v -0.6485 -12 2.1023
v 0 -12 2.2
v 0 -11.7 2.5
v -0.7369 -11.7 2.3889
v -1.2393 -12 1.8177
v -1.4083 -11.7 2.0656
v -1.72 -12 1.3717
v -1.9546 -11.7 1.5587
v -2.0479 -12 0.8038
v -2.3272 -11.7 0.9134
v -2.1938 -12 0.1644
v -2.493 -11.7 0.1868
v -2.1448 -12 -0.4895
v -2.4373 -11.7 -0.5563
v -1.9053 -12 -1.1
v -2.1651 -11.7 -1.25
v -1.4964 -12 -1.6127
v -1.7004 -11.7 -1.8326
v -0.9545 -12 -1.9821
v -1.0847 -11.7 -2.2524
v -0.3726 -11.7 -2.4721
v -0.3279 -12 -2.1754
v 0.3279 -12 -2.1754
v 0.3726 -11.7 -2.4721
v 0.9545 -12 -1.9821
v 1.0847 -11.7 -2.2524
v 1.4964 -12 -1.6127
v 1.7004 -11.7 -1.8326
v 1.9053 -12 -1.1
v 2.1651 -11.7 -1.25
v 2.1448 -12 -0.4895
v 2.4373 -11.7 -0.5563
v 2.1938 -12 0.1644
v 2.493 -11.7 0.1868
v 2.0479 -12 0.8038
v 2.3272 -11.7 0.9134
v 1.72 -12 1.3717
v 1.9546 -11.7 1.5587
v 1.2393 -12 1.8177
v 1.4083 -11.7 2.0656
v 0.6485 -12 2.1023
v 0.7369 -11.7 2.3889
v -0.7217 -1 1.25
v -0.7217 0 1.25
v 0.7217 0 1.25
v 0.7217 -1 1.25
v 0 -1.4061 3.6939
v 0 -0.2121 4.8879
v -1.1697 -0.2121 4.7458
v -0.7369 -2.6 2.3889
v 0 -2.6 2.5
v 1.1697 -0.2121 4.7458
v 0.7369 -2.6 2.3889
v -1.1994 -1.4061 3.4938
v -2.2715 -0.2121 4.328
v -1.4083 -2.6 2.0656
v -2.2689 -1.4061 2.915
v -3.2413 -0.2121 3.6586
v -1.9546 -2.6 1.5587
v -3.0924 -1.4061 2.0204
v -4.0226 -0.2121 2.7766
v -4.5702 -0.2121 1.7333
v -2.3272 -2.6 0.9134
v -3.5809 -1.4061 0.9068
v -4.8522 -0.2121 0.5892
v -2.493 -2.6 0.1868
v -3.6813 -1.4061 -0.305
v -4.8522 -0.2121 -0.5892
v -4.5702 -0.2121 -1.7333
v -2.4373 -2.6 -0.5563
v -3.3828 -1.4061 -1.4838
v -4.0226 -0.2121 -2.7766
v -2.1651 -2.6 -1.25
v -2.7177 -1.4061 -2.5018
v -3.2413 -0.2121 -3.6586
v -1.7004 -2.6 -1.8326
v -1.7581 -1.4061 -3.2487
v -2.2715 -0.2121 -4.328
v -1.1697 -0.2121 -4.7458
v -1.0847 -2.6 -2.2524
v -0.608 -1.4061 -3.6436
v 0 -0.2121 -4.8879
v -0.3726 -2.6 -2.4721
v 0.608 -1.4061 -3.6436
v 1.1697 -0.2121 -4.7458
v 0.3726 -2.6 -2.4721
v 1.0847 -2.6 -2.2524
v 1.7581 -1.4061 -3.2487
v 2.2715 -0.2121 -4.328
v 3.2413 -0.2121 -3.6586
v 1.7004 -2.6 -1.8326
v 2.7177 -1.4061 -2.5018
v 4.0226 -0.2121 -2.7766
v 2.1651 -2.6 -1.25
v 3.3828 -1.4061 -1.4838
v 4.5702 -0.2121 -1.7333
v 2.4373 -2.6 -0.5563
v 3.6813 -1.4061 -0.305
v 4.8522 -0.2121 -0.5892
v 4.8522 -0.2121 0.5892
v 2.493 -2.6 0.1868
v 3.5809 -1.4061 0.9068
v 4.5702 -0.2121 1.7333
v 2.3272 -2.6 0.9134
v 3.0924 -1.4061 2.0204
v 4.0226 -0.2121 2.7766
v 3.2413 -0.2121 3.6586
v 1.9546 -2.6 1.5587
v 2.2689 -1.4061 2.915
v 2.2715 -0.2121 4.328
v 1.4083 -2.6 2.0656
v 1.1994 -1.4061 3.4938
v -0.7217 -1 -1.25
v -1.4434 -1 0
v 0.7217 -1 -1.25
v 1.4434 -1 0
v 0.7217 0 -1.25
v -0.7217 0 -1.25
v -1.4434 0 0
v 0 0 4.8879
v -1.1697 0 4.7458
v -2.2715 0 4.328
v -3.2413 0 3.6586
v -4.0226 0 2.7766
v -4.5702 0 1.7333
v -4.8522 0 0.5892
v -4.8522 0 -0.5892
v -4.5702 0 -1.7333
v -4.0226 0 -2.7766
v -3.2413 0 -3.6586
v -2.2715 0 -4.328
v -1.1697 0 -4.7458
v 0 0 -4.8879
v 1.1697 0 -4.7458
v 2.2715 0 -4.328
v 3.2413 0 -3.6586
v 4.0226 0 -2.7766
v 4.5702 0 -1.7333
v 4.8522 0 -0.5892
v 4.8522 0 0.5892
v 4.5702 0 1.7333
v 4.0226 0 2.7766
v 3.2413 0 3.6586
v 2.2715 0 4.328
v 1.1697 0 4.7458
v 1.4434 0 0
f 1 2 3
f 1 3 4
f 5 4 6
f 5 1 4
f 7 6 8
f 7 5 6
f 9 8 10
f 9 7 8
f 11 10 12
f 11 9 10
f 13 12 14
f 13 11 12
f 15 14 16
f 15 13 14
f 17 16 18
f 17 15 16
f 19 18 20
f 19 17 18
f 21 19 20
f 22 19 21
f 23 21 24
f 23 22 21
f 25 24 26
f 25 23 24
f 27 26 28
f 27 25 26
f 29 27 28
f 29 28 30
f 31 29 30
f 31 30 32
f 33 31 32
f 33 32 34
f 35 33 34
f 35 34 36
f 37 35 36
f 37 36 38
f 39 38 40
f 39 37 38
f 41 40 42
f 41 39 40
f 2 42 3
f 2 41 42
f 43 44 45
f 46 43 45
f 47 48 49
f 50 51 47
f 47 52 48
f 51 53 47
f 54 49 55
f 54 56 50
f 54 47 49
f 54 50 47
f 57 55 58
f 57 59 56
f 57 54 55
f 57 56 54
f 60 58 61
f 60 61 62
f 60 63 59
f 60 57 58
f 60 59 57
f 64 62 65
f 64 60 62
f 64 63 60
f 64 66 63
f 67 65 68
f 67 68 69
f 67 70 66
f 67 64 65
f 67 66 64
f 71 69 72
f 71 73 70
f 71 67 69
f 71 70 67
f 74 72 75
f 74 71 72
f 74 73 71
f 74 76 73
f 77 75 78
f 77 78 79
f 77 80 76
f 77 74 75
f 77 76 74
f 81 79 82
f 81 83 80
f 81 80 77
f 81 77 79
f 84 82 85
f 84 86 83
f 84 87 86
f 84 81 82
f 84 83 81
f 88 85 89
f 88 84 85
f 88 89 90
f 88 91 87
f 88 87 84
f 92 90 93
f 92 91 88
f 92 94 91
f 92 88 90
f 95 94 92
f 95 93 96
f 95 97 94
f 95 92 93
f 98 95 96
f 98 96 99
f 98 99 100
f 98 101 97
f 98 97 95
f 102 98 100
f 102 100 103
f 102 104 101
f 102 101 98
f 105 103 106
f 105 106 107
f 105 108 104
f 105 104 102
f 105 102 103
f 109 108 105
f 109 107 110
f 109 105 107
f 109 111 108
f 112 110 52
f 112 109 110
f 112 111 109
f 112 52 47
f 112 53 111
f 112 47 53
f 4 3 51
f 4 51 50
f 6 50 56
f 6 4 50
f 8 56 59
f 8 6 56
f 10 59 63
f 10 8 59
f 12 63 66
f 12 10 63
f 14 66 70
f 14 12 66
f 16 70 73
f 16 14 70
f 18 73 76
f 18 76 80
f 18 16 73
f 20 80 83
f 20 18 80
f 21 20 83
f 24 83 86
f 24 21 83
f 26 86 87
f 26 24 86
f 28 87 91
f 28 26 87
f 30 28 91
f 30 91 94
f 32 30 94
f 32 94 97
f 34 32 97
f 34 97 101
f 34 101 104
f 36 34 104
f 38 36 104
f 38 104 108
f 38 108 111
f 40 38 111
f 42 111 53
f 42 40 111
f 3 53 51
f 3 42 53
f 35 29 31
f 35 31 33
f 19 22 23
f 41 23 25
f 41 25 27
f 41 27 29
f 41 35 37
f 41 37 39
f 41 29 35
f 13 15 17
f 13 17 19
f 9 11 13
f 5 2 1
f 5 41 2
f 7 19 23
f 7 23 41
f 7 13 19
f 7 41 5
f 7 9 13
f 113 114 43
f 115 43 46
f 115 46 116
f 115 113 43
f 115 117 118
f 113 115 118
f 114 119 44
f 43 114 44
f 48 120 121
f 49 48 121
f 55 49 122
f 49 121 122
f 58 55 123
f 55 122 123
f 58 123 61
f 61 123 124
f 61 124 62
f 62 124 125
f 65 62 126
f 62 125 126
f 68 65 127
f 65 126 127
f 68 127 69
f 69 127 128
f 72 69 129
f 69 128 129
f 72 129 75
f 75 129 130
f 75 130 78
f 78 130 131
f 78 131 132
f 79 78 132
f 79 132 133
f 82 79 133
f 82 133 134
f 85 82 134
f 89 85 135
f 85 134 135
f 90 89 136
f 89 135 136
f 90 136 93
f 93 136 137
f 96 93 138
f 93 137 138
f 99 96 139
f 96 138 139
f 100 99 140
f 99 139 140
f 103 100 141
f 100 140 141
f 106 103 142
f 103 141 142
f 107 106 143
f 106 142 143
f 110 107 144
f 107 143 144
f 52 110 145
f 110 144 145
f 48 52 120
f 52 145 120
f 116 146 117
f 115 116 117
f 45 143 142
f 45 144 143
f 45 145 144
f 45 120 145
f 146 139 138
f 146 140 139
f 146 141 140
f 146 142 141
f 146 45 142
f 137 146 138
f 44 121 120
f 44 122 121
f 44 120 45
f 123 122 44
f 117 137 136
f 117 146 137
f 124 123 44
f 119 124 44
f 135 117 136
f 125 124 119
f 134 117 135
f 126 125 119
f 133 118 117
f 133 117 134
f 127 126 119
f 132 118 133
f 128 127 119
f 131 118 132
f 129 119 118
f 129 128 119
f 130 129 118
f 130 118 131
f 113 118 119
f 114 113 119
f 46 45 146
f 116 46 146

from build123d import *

# Parameters (mm, degrees)
CHAFL_N2_SIZE         = 0.3
CHAFL_N2_SIZE2        = 0.212132034
CHAFL_N3_SIZE         = 0.3
CORTAR_EXTRUIR2_DEPTH = 1


with BuildPart() as part:
    # Croquis1 → Revolución1 (revolve)
    with BuildSketch(Plane.XY, mode=Mode.PRIVATE) as revoluci_n1_sk:
        Polygon((0, 0), (5.1, 0), (2.5, -2.6), (2.5, -12), (0, -12), align=None)
    revolve(revoluci_n1_sk.sketch.rotate(Axis((0, 0, 0), (0, -1, 0)), 90), axis=Axis((0, 0, 0), (0, -1, 0)))

    # Chaflán2
    chafl_n2_edges = [part.edges().sort_by_distance(p)[0] for p in [
        (0, 0, -5.1),
    ]]
    chafl_n2_side = [part.faces().sort_by_distance(p)[0] for p in [
        (0, -1.3, -3.8),
    ]]
    chamfer(chafl_n2_edges, length=CHAFL_N2_SIZE, length2=CHAFL_N2_SIZE2, reference=chafl_n2_side[0])

    # Chaflán3
    chafl_n3_edges = [part.edges().sort_by_distance(p)[0] for p in [
        (0, -12, -2.5),
    ]]
    chamfer(chafl_n3_edges, length=CHAFL_N3_SIZE)

    # Croquis3 → Cortar-Extruir2 (cut)
    with BuildSketch(Plane(origin=(0, 0, 0), x_dir=(1, 0, 0), z_dir=(0, 1, 0))):
        Polygon((-0.721687836, 1.25), (-1.443375673, 0), (-0.721687836, -1.25), (0.721687836, -1.25), (1.443375673, 0), (0.721687836, 1.25), align=None)
    extrude(amount=-CORTAR_EXTRUIR2_DEPTH, mode=Mode.SUBTRACT)


solid = part.part
